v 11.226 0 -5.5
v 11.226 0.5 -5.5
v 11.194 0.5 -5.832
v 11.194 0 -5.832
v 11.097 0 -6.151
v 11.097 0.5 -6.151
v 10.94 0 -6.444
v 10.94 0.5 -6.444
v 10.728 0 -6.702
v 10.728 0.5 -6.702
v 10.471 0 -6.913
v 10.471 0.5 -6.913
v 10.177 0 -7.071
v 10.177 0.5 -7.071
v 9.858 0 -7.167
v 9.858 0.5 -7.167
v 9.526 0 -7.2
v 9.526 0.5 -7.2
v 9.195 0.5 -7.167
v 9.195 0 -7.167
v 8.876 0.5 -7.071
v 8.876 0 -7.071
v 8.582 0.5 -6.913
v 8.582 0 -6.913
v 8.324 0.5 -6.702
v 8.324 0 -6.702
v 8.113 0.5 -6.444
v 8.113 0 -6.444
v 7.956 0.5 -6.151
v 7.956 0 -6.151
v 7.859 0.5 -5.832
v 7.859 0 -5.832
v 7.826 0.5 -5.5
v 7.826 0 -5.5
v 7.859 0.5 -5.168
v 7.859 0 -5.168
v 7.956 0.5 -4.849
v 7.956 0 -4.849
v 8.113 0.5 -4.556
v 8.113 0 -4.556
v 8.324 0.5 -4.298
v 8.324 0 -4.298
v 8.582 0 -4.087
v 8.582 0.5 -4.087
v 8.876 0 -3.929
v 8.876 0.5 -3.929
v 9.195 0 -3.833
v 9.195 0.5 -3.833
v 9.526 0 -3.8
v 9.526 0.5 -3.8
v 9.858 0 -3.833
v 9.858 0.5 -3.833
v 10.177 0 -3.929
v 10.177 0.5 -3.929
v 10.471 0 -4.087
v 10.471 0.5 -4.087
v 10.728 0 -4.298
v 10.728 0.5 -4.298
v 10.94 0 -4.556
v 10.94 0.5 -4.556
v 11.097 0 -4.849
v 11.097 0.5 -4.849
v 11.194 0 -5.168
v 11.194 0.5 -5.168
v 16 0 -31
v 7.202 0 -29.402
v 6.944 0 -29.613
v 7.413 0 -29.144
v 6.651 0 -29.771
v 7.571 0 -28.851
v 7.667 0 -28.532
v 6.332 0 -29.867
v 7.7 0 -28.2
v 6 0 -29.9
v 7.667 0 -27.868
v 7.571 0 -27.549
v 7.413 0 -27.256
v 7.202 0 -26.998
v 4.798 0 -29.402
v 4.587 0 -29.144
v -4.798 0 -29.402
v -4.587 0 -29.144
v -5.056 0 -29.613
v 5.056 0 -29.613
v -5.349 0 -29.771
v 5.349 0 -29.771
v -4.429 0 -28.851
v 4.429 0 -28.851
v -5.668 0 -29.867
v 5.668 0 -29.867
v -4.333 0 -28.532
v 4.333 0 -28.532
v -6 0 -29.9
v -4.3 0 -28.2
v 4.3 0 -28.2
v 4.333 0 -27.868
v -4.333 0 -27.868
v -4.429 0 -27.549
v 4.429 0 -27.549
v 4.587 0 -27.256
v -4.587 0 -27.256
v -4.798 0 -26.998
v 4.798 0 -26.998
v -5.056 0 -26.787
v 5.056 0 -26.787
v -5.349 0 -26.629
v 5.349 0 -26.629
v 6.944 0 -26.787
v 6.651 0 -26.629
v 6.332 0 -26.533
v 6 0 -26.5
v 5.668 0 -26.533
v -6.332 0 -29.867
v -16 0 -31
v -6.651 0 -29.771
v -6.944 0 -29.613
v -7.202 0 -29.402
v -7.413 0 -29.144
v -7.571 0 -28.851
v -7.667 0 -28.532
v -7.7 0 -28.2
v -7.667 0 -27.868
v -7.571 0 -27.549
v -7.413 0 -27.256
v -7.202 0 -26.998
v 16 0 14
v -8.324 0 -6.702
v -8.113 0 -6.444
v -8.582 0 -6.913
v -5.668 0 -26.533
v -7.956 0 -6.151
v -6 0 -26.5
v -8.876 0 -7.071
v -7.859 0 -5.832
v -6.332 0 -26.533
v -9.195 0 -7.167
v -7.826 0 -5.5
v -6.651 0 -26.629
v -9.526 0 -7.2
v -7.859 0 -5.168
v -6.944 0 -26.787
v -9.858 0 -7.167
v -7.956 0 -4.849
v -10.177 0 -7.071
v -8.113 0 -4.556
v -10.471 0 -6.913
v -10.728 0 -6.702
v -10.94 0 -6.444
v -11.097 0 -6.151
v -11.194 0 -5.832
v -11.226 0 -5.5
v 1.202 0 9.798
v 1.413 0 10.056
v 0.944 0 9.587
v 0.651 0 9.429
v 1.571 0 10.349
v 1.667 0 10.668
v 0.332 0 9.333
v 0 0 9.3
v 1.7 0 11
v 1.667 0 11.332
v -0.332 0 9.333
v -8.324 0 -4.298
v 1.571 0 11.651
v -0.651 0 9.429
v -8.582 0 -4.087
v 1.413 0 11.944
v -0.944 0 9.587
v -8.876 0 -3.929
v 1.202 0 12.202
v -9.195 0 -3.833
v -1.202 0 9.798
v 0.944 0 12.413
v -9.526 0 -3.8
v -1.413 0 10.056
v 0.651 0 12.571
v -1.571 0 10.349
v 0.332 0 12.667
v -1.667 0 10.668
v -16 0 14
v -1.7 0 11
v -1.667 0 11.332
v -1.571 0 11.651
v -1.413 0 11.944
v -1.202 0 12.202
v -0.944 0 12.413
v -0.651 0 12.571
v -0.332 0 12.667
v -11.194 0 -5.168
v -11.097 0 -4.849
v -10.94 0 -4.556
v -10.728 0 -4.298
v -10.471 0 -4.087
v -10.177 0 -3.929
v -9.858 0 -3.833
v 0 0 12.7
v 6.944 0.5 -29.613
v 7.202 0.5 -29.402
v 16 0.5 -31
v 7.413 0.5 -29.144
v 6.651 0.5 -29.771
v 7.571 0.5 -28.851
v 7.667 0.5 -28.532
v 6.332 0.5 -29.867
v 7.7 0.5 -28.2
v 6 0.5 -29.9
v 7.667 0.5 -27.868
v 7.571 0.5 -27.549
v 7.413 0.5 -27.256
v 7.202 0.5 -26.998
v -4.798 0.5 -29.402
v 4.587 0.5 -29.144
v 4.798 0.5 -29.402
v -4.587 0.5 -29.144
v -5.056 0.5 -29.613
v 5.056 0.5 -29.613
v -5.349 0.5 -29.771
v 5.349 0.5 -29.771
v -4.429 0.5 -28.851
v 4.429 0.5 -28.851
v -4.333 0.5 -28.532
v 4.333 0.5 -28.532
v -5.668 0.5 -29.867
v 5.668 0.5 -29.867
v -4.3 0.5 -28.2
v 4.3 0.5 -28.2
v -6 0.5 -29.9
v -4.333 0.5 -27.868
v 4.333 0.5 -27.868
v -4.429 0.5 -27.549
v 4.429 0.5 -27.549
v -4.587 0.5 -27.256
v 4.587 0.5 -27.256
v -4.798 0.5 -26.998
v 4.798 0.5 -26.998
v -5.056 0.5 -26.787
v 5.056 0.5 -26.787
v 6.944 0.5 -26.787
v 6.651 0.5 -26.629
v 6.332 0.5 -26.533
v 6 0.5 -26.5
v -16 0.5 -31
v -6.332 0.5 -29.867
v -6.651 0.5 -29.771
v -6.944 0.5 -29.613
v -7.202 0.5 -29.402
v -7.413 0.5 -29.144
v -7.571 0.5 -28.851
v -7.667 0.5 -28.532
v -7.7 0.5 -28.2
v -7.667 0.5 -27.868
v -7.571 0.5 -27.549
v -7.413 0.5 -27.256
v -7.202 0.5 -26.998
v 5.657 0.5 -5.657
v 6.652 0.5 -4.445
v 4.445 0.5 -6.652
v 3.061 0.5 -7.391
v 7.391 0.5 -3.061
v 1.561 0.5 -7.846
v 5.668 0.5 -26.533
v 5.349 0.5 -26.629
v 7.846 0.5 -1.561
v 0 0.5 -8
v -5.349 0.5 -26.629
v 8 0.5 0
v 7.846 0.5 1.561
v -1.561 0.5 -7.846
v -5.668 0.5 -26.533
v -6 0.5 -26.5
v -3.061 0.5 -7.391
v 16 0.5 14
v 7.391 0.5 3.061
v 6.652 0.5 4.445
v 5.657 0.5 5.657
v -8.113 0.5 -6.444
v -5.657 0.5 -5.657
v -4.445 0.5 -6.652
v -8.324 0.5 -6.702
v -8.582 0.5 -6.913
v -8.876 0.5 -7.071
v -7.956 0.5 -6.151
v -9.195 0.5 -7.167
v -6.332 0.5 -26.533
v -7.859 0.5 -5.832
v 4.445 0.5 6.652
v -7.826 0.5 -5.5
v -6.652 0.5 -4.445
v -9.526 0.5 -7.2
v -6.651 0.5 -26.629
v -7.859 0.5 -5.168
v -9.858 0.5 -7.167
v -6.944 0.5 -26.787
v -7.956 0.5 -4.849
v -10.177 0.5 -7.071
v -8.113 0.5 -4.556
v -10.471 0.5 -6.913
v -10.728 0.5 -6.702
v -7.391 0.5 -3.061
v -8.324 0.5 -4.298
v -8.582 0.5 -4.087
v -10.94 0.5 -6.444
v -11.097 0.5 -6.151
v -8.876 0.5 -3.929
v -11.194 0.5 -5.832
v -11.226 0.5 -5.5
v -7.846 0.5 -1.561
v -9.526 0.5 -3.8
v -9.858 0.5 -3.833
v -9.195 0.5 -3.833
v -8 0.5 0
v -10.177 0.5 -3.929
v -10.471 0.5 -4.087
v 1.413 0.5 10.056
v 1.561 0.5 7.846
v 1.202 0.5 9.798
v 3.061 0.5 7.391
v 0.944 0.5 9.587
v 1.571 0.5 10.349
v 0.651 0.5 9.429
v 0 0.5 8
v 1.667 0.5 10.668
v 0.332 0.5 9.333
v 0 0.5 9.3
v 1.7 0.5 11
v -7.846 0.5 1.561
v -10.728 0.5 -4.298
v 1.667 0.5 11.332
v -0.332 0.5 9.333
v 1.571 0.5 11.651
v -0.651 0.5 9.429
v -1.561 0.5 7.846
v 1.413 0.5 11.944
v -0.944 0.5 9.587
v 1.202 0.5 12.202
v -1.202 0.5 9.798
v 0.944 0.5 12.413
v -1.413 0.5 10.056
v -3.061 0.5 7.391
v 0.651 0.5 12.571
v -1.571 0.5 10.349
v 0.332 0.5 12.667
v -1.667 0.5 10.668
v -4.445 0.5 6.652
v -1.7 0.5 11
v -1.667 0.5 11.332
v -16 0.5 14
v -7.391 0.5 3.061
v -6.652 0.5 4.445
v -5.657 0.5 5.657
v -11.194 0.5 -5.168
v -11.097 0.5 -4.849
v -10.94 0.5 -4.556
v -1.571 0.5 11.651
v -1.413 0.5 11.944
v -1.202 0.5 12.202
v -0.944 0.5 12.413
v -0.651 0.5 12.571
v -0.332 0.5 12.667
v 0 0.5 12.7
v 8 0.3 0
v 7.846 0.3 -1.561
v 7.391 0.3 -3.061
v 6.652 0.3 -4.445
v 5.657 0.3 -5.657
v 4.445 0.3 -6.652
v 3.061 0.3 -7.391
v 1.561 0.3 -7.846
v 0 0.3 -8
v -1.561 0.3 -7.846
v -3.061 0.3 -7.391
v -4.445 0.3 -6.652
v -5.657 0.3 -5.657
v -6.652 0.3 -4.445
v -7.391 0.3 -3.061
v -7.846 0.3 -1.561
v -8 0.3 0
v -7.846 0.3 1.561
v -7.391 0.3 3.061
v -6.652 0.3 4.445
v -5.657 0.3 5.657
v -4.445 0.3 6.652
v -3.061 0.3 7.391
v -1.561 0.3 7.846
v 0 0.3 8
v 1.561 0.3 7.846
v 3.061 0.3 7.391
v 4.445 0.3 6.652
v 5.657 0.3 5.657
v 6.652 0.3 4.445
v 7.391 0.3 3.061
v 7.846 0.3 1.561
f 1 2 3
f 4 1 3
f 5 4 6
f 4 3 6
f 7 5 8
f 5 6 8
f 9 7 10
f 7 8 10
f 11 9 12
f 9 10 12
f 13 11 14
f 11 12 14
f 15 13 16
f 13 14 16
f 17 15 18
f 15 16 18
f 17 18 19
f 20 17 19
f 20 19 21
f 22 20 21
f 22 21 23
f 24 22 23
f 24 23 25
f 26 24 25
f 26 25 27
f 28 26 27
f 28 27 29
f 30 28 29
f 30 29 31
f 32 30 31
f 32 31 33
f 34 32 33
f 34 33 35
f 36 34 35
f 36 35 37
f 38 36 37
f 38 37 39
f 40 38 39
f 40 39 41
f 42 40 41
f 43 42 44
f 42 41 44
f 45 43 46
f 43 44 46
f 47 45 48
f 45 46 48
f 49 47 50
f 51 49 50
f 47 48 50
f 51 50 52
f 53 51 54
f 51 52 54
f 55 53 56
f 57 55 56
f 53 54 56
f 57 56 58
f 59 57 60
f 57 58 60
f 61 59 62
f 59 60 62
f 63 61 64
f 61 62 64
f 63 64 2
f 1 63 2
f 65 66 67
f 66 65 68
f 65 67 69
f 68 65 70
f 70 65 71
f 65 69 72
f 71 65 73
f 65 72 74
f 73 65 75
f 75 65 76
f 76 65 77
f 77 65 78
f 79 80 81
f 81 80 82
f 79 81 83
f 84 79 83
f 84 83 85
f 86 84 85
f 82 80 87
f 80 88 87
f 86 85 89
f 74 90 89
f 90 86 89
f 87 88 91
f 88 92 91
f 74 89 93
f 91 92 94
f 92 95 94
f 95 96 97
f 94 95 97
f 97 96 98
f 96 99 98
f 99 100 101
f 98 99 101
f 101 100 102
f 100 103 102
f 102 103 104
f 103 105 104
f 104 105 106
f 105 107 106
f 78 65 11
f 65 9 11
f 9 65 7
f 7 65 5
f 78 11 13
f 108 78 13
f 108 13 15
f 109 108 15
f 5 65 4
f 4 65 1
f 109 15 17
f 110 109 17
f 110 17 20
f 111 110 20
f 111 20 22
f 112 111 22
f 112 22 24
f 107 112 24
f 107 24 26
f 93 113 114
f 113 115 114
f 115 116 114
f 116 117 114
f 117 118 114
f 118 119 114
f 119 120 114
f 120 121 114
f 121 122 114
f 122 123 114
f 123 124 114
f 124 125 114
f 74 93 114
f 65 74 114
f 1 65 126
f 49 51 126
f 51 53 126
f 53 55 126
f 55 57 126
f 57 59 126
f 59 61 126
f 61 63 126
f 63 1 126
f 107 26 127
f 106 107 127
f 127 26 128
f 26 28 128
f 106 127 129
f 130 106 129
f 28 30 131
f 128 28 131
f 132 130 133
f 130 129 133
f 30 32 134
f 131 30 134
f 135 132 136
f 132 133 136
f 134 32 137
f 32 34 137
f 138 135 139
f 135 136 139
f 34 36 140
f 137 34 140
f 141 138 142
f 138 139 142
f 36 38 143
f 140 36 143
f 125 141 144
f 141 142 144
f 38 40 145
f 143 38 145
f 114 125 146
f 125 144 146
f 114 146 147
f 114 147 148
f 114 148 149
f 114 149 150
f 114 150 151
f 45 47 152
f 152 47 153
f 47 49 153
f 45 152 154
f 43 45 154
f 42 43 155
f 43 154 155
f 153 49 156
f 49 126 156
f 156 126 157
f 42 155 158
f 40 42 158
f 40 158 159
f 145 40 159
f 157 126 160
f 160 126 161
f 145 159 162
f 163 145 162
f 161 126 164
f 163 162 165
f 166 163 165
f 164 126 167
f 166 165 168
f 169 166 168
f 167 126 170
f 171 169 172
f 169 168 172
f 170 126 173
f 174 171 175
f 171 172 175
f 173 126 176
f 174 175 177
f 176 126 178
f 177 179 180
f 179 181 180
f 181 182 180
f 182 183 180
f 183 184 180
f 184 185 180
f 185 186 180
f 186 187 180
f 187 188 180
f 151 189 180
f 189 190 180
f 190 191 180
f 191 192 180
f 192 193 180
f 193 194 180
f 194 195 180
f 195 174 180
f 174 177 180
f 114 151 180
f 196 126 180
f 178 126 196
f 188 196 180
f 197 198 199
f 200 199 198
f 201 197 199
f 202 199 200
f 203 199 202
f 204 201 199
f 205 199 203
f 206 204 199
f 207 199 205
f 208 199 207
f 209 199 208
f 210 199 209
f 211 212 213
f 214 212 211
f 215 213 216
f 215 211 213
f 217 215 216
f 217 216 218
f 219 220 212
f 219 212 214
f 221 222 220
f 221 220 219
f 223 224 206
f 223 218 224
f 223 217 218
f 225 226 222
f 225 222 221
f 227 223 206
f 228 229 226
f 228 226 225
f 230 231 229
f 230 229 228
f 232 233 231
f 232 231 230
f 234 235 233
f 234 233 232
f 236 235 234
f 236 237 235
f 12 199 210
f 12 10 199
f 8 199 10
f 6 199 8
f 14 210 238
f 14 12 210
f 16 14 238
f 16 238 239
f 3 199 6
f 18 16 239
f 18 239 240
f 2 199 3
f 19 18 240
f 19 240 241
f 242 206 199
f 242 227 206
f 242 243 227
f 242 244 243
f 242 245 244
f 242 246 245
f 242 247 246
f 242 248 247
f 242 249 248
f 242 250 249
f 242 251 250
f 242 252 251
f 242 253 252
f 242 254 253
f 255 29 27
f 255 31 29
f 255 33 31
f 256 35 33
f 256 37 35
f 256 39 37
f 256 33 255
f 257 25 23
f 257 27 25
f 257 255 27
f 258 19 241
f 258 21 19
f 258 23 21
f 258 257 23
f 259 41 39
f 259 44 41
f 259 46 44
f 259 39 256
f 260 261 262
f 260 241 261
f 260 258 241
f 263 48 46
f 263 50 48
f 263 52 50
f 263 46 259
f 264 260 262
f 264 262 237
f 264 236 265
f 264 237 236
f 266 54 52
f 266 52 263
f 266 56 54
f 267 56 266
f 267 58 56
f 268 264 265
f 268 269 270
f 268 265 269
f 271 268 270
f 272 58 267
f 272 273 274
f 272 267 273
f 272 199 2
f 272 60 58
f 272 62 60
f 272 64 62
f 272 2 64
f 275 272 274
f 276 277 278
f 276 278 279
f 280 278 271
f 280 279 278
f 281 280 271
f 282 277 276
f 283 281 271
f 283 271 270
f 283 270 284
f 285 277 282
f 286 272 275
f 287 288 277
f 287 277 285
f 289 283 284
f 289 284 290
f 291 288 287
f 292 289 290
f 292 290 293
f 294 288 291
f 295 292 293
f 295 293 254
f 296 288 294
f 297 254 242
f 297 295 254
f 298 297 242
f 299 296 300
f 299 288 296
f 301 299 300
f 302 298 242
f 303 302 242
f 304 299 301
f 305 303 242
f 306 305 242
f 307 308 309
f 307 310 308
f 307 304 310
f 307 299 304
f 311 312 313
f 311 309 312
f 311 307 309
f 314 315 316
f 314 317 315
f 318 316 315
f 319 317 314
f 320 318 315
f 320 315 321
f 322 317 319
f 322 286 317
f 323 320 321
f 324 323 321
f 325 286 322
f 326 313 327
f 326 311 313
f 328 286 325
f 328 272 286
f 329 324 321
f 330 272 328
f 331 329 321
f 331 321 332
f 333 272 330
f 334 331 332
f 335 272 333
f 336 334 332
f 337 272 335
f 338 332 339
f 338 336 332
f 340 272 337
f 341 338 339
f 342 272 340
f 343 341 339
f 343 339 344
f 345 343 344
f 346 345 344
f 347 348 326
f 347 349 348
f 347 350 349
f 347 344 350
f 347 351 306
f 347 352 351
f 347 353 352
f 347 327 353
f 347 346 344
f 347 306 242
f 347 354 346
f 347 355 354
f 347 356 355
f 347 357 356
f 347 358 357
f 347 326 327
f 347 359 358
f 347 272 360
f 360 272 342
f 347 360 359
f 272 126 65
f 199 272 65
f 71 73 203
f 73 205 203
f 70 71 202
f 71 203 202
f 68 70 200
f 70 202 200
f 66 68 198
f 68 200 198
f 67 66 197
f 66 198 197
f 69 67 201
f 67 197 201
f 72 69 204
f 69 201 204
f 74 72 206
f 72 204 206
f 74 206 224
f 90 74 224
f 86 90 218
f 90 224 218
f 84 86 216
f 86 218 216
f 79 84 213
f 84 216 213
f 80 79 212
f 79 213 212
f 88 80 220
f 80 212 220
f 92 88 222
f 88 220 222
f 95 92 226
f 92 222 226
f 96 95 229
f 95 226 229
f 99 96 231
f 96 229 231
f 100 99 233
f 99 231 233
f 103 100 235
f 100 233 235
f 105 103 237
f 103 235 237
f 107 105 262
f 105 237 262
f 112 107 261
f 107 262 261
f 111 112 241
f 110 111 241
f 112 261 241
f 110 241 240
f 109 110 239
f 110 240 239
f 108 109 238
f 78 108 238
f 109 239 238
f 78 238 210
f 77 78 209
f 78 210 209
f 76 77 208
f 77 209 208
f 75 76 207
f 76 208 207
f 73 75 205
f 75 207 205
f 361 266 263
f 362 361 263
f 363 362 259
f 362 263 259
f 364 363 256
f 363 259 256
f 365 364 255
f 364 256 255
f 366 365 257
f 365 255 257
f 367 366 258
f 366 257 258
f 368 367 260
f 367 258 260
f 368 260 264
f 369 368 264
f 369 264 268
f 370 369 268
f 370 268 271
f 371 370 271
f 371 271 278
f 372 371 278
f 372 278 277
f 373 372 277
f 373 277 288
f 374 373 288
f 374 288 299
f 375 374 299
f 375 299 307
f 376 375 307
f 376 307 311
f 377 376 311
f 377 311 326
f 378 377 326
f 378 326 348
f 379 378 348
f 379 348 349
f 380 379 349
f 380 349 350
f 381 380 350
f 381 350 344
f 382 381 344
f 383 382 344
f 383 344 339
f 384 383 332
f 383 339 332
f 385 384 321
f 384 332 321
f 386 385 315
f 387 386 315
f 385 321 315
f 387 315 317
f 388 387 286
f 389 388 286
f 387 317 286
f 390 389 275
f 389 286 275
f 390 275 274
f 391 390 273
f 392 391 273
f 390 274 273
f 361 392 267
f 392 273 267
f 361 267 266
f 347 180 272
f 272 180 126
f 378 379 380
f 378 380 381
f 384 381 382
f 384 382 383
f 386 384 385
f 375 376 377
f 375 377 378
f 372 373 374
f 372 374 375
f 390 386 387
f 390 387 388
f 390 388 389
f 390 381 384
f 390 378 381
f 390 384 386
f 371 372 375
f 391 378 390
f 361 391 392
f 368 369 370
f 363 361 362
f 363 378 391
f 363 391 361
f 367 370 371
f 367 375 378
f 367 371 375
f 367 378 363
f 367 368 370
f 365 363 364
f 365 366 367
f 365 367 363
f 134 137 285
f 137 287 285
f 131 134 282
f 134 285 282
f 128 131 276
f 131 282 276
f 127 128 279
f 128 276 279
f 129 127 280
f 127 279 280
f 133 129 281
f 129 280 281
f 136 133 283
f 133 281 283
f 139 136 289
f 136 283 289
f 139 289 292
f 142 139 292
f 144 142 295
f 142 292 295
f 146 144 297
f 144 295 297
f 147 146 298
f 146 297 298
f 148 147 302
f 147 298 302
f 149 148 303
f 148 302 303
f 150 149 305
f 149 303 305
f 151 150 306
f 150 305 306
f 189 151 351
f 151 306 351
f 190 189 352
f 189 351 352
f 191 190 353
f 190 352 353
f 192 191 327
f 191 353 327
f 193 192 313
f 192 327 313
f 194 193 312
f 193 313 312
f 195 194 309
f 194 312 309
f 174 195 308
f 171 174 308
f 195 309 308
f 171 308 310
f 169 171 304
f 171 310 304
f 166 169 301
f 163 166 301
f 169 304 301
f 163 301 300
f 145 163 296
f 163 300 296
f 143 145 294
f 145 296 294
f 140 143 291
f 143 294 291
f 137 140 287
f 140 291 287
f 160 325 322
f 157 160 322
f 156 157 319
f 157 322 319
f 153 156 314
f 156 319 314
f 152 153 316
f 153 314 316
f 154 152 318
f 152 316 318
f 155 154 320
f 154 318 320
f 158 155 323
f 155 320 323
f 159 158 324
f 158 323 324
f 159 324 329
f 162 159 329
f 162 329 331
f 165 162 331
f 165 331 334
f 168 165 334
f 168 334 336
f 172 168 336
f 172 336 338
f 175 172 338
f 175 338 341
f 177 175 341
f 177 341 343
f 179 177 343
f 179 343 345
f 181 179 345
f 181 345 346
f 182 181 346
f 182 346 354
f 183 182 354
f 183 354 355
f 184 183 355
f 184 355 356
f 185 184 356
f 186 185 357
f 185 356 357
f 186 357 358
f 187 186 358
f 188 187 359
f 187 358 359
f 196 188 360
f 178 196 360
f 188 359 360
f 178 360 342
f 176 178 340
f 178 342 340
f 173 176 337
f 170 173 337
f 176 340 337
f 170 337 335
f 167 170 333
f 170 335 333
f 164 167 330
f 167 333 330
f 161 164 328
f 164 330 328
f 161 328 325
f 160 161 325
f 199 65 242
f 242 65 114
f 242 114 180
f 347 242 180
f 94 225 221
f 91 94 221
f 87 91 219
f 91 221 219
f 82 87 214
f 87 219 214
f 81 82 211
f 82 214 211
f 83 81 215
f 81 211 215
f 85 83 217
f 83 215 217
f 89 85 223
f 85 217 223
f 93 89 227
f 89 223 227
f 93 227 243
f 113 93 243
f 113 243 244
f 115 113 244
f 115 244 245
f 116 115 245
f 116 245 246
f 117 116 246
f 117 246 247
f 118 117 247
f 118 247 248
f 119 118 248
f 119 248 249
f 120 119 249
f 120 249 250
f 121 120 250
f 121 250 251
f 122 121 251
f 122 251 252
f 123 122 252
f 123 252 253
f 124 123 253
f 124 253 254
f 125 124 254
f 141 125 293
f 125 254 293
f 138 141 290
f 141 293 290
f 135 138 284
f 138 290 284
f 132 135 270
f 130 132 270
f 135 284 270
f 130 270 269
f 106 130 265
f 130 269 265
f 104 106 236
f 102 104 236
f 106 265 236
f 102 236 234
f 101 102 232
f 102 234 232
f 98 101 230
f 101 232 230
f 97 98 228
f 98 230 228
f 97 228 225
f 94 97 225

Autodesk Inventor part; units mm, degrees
ref_plane "YZ Plane" through (0, 0, 0) normal (1, 0, 0) x (0, 1, 0)
ref_plane "XZ Plane" through (0, 0, 0) normal (0, 1, 0) x (-1, 0, 0)
ref_plane "XY Plane" through (0, 0, 0) normal (0, 0, 1) x (1, 0, 0)
sketch "スケッチ1" plane through (0, 0, 0) normal (0, 1, 0) x (-1, 0, 0)
  line L0 (16, -31) -> (16, 14)
  line L1 (16, 14) -> (-16, 14)
  line L2 (-16, 14) -> (-16, -31)
  line L3 (-16, -31) -> (16, -31)
  line L4 (0, 0) -> (0, -32.6995) construction
  point P0 (0, 14)
  dimension "d0" = 45
  dimension "d1" = 32
  dimension "d2" = 14
extrude "押し出し1" add sketch "スケッチ1" along normal blind 0.5
sketch "スケッチ4" plane through (0, 0.5, 0) normal (0, 1, 0) x (1, 0, 0)
  circle A0 centre (0, -11) radius 1.7
  line L0 (0, 0) -> (-18.7084, 0) construction
  circle A1 centre (-6, 28.2) radius 1.7
  circle A2 centre (6, 28.2) radius 1.7
  line L1 (0, 0) -> (0, 29.6633) construction
  line L2 (16, 31) -> (-16, 31) projected
  circle A3 centre (9.5263, 5.5) radius 1.7
  circle A4 centre (-9.5263, 5.5) radius 1.7
  point P0 (0, 31)
  dimension "d12" = 3.4
  dimension "d35" = 3.4
  dimension "d36" = 3.4
  dimension "d37" = 6
  dimension "d38" = 2.8
  dimension "d39" = 11
  dimension "d42" = 360
extrude "押し出し3" cut sketch "スケッチ4" against normal through all
sketch "スケッチ6" plane through (0, 0.5, 0) normal (0, 1, 0) x (1, 0, 0)
  circle A0 centre (0, 0) radius 8
  dimension "d44" = 16
extrude "押し出し5" cut sketch "スケッチ6" against normal blind 0.2
properties part number "B_holder_sub_5" material "ステンレス鋼 440C"
